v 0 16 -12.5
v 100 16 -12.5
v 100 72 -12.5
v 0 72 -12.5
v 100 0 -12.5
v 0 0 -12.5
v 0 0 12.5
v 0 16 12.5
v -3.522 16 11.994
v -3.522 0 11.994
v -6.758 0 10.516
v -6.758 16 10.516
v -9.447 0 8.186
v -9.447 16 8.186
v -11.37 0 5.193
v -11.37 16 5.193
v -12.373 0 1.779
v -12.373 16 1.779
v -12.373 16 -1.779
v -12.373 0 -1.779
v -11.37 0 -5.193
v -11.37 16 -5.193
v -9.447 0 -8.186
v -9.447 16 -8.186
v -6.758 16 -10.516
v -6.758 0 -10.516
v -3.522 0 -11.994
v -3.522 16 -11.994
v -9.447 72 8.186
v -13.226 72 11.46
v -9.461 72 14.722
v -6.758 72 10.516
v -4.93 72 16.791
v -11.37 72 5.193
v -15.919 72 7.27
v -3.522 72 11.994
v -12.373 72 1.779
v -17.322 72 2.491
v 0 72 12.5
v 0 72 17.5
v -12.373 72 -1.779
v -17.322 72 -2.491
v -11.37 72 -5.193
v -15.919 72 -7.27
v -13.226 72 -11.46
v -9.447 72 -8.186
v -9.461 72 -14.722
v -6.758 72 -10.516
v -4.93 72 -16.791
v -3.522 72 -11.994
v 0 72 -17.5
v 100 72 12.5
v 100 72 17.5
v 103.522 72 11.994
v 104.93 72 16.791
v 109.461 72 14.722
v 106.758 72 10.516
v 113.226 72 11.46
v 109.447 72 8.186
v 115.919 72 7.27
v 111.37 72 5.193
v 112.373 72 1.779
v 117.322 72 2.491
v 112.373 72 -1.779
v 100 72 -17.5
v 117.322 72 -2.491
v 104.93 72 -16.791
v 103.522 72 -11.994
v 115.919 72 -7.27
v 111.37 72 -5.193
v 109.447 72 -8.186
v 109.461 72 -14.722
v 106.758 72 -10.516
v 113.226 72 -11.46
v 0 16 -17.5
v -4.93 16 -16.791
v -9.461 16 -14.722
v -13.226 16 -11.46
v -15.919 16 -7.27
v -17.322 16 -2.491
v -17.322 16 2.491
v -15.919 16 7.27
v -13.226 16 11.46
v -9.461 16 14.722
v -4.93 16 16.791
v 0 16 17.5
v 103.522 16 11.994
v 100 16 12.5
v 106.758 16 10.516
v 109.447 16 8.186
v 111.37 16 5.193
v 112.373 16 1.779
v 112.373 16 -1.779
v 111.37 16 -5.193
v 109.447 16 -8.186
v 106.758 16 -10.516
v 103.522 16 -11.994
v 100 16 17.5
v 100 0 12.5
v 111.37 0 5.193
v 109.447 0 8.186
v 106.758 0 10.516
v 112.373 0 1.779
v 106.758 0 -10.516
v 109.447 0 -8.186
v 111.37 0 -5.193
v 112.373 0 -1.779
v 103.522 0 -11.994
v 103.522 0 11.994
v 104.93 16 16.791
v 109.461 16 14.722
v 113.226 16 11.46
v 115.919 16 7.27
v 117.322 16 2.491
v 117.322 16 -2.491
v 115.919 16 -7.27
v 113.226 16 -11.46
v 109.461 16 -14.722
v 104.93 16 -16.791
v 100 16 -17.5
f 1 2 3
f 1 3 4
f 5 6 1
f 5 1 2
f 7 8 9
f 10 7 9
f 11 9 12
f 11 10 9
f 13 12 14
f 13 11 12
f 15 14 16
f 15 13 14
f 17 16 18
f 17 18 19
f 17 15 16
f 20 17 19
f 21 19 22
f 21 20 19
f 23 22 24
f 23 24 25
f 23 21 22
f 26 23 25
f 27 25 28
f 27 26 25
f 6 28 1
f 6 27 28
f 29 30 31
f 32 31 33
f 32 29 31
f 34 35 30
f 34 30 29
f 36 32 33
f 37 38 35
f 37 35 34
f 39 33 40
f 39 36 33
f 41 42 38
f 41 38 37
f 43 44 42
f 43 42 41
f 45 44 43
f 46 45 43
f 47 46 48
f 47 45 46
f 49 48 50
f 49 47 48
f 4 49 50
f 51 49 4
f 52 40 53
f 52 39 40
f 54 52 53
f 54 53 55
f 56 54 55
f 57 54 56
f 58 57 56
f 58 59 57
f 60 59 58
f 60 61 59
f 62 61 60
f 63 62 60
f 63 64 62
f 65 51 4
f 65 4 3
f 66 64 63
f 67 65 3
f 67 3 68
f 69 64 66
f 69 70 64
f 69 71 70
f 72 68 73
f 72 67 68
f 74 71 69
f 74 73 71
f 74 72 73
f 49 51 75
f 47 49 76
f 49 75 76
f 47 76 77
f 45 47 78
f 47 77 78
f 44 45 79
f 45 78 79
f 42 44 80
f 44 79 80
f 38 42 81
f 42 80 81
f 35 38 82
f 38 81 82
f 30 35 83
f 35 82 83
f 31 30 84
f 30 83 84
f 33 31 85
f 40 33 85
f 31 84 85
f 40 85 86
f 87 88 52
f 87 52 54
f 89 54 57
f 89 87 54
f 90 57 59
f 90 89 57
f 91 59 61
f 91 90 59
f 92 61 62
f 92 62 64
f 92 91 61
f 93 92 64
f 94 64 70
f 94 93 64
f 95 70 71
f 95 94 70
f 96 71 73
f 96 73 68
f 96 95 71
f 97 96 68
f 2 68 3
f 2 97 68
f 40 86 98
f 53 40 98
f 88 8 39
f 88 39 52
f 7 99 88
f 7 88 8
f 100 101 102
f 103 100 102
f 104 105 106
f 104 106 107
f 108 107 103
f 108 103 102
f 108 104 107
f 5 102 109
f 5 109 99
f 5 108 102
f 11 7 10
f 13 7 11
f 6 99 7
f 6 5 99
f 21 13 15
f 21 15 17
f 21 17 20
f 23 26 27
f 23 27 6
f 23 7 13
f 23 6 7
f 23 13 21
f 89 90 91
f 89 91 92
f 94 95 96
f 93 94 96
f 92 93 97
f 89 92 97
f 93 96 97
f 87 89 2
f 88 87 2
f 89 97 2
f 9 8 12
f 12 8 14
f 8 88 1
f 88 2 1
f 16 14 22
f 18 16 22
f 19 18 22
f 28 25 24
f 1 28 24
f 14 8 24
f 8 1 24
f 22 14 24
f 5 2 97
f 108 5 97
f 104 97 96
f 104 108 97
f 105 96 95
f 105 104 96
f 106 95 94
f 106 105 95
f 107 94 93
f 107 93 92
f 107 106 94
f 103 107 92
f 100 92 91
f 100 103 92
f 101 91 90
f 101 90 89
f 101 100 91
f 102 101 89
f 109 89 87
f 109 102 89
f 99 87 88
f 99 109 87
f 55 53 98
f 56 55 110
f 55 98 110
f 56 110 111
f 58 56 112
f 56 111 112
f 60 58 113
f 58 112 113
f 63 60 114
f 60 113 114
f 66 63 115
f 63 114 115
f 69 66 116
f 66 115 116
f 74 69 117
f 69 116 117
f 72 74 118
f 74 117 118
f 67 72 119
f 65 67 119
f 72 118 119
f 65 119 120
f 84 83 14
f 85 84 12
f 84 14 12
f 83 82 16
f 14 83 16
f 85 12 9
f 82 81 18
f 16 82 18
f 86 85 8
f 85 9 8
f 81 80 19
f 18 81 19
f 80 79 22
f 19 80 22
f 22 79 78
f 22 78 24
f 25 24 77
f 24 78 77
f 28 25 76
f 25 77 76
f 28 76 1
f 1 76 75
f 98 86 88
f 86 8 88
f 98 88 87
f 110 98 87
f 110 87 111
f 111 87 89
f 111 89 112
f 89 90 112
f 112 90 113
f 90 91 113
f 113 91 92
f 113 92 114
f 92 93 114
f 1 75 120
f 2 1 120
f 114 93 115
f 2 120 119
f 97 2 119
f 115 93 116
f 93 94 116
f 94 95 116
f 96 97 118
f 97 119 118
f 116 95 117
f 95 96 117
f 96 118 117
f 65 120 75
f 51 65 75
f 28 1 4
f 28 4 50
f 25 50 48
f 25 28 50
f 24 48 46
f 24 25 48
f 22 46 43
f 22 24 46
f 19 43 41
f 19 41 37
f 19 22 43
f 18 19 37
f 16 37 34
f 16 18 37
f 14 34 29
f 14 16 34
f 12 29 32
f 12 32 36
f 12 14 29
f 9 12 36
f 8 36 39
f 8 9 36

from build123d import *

# Parameters (mm, degrees)
EXTRUDE_2_DEPTH = 16
EXTRUDE_1_DEPTH = 56


with BuildPart() as part:
    # 草图1 → 凸台-拉伸2 (new body)
    with BuildSketch(Plane(origin=(0, 0, 0), x_dir=(1, 0, 0), z_dir=(0, 1, 0))):
        with BuildLine():
            Line((0, 12.5), (100, 12.5))
            ThreePointArc((100, 12.5), (112.5, 0), (100, -12.5))
            Line((100, -12.5), (0, -12.5))
            ThreePointArc((0, -12.5), (-12.5, 0), (0, 12.5))
        make_face()
    extrude(amount=EXTRUDE_2_DEPTH)


with BuildPart() as body_2:
    # 草图5 → 拉伸-薄壁1 (new body)
    with BuildSketch(Plane(origin=(0, 16, 0), x_dir=(1, 0, 0), z_dir=(0, 1, 0))):
        with BuildLine():
            Line((100, 17.5), (0, 17.5))
            ThreePointArc((0, 17.5), (-17.5, 0), (0, -17.5))
            Line((0, -17.5), (100, -17.5))
            ThreePointArc((100, -17.5), (117.5, 0), (100, 17.5))
        make_face()
        with BuildLine():
            Line((100, 12.5), (0, 12.5))
            ThreePointArc((0, 12.5), (-12.5, 0), (0, -12.5))
            Line((0, -12.5), (100, -12.5))
            ThreePointArc((100, -12.5), (112.5, 0), (100, 12.5))
        make_face(mode=Mode.SUBTRACT)
    extrude(amount=EXTRUDE_1_DEPTH)


solid = Compound([part.part, body_2.part])
